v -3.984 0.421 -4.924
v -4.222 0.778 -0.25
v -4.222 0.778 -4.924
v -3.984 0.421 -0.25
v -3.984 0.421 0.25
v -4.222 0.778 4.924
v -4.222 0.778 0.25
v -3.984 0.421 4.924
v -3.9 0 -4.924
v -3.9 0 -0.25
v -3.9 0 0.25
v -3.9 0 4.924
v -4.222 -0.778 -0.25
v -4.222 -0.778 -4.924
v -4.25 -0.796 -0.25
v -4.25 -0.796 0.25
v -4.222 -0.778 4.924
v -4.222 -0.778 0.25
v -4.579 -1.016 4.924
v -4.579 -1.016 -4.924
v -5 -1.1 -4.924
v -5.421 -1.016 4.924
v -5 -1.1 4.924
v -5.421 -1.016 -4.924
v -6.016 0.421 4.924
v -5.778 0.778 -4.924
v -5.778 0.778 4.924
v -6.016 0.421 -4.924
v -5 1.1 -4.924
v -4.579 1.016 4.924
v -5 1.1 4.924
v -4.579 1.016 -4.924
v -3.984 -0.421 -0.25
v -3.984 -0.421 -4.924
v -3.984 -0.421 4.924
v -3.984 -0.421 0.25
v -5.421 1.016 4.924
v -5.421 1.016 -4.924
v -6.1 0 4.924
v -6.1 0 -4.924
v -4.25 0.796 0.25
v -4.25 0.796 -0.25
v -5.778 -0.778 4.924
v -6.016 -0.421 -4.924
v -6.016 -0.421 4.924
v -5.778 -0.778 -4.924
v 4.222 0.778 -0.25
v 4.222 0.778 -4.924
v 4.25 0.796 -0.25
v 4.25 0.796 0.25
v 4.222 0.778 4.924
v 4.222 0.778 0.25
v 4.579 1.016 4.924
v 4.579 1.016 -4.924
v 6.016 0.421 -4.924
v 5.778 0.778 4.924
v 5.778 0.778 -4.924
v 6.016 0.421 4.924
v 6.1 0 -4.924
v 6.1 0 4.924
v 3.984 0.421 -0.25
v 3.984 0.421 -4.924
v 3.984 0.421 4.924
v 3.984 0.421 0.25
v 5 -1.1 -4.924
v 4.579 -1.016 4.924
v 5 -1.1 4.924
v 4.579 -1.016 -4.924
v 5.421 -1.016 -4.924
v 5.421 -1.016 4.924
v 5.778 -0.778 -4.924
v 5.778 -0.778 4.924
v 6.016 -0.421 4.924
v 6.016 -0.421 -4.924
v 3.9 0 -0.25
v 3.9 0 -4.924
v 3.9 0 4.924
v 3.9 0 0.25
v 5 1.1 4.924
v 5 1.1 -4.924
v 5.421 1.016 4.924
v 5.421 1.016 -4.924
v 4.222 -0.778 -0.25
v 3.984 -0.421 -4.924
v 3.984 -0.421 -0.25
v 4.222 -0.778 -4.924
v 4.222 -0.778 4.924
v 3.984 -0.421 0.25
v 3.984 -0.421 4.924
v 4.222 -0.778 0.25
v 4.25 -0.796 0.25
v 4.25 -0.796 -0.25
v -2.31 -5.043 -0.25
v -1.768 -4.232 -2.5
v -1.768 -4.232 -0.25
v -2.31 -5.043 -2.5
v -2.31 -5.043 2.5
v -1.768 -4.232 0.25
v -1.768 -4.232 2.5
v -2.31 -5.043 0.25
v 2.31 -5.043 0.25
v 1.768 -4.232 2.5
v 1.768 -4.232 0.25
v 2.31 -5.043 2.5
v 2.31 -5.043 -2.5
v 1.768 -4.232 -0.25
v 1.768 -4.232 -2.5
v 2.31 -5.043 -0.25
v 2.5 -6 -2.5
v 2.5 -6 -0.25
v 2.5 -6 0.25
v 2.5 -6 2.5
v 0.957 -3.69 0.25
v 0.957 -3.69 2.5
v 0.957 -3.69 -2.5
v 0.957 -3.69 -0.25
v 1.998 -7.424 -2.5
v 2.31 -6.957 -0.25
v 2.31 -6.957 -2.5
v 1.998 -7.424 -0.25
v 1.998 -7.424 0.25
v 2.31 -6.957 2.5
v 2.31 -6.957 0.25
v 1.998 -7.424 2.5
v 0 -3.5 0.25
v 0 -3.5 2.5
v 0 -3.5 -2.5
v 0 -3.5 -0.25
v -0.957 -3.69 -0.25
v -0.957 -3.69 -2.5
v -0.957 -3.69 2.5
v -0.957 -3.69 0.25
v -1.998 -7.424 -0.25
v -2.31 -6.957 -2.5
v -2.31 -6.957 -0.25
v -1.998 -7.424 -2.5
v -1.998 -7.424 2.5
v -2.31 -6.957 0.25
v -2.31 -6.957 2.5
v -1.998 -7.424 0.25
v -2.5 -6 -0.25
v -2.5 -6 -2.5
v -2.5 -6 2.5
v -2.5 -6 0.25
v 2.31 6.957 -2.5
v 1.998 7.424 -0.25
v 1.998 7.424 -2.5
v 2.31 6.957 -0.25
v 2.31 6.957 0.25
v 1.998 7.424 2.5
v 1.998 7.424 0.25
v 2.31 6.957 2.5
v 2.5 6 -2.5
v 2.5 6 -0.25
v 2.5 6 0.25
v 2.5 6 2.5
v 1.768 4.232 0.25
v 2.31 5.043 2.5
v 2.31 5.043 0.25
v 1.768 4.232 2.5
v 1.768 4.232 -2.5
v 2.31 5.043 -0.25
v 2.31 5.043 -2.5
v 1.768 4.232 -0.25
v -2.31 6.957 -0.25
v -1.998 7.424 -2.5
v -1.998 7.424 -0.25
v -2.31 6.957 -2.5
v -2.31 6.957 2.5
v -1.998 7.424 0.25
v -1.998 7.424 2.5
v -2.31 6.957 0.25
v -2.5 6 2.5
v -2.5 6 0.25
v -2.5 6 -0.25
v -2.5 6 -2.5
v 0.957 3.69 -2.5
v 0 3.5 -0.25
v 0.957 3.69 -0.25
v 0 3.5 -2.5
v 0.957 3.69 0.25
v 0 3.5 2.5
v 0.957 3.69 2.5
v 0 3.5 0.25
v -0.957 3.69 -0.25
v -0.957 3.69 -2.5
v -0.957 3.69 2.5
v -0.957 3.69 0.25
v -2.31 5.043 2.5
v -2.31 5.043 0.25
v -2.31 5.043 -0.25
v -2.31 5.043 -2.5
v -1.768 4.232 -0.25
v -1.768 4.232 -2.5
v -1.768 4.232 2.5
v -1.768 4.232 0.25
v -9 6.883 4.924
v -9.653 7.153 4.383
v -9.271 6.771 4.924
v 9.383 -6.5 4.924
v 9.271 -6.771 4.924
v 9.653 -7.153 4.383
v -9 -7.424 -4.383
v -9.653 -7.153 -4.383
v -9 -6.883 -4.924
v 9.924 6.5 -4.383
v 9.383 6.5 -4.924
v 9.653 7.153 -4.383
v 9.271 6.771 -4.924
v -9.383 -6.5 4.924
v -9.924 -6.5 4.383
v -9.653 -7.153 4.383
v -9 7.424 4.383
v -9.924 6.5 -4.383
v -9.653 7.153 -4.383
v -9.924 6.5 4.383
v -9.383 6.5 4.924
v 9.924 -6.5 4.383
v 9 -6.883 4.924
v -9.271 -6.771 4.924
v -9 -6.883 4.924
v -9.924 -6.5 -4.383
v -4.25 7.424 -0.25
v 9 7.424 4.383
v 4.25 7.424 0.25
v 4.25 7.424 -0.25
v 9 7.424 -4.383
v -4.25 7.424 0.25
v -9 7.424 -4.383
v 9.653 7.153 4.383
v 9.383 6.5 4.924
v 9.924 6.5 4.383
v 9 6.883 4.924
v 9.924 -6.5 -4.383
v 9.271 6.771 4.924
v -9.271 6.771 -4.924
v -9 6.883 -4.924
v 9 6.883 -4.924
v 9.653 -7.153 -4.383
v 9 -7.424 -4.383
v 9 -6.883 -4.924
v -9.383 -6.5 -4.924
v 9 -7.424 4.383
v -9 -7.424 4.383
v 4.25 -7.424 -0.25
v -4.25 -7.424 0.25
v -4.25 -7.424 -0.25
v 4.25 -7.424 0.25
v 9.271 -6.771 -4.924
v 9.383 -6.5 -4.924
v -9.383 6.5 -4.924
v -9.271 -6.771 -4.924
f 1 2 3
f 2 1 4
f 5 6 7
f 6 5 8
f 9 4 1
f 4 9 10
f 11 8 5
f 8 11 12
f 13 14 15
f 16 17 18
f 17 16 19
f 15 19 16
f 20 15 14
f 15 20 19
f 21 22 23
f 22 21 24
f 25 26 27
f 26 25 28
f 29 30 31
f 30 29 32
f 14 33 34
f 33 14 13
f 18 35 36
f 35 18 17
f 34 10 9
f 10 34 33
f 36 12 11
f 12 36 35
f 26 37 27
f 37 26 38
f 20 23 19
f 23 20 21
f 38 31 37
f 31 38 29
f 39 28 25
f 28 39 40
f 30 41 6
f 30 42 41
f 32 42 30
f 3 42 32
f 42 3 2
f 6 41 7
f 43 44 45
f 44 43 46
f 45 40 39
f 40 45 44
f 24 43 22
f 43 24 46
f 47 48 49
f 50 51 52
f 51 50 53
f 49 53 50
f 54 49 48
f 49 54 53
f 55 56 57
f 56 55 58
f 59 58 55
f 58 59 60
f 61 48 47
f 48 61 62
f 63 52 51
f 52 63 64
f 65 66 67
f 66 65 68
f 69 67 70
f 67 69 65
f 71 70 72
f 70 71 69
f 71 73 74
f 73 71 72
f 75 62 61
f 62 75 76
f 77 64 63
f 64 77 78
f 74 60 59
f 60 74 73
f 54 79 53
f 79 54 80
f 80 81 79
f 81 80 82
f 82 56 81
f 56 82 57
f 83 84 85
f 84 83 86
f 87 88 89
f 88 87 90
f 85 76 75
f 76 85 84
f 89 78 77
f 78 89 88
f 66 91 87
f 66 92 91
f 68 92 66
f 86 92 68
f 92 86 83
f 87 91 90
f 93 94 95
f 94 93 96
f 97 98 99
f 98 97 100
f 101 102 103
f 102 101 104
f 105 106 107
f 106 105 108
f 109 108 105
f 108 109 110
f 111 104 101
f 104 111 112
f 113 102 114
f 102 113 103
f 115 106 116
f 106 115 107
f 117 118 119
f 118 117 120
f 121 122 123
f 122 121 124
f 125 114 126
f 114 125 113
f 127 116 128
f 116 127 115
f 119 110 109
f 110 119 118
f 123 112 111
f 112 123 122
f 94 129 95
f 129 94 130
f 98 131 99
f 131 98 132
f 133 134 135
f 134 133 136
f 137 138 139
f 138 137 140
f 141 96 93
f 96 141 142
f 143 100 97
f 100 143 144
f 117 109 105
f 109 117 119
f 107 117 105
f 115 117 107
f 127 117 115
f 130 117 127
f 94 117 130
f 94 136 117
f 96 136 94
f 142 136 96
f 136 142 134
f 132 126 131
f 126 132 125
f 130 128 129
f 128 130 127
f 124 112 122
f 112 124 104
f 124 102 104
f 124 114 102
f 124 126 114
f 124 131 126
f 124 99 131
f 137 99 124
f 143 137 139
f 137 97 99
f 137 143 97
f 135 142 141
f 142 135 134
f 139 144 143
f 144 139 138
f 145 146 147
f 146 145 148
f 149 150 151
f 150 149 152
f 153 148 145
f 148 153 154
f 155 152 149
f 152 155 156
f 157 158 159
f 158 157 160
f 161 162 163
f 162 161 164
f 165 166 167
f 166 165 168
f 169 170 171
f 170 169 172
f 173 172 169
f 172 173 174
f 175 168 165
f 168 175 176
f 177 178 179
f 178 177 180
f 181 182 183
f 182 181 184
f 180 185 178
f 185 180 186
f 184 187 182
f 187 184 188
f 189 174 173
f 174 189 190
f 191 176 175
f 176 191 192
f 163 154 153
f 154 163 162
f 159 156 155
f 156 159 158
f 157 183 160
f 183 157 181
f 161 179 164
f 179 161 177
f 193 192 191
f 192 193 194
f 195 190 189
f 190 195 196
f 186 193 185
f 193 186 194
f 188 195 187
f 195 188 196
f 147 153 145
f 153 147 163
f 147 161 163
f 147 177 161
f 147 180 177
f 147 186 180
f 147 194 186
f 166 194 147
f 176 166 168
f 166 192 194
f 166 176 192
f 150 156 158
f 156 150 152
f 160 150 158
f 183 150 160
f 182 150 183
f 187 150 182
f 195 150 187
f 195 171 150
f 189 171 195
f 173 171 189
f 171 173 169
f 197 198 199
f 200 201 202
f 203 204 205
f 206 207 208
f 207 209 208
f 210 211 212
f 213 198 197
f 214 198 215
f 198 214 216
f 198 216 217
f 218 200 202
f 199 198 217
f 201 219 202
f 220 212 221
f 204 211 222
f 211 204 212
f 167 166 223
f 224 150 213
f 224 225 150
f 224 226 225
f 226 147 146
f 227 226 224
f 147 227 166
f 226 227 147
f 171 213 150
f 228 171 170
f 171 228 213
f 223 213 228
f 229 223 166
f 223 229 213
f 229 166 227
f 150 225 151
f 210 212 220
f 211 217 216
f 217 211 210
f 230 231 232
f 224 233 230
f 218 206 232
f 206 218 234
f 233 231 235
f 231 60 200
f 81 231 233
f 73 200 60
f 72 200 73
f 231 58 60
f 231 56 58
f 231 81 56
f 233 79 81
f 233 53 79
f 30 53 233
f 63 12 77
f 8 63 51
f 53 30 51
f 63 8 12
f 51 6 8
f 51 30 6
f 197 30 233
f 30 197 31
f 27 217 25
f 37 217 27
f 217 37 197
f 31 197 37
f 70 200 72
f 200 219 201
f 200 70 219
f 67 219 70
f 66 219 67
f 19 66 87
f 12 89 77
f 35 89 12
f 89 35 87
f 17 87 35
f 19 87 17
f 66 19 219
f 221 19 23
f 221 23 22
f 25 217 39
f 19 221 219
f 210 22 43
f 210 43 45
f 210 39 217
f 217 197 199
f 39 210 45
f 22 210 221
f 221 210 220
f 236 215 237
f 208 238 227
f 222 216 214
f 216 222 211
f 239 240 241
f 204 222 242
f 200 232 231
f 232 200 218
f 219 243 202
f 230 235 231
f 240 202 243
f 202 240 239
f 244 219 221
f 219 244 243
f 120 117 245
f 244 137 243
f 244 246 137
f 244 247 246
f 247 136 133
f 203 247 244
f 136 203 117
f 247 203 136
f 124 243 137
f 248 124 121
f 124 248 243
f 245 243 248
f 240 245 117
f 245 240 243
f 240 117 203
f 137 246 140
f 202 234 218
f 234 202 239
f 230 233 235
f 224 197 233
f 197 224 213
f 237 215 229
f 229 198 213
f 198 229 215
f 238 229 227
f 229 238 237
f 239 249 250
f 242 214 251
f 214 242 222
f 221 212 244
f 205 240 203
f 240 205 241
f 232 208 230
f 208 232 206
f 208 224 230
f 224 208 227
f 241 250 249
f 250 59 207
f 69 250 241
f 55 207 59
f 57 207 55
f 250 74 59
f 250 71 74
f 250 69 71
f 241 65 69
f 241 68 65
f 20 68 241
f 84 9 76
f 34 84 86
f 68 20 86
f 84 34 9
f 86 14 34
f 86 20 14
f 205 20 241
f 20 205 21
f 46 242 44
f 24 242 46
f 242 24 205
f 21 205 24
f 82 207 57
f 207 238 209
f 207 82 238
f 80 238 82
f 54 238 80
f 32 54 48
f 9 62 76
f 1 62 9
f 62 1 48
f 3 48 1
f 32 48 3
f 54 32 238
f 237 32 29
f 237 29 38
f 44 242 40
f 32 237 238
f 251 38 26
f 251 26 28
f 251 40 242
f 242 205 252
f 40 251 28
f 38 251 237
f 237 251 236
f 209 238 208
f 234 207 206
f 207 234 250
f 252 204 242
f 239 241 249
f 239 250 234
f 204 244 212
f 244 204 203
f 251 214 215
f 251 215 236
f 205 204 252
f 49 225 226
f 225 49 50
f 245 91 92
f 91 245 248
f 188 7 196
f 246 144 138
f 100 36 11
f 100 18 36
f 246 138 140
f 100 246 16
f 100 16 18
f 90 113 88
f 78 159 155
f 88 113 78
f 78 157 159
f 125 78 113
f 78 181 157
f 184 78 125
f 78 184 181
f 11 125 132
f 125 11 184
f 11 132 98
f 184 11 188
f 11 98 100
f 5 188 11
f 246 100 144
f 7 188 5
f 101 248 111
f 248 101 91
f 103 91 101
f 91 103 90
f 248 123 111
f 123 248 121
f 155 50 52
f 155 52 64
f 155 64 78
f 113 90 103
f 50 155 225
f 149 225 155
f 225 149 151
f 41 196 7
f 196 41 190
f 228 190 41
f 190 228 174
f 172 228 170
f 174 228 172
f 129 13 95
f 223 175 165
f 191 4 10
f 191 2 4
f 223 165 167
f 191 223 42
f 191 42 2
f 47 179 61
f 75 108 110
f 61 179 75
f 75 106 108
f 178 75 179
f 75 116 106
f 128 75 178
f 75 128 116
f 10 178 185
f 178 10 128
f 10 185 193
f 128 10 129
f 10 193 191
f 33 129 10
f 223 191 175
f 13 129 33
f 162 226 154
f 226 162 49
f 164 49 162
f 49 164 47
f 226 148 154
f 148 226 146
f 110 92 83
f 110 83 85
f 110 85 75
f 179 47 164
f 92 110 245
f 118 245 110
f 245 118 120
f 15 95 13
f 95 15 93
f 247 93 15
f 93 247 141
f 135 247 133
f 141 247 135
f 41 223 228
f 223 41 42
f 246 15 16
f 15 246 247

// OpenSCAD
// ============================================================
//  tpu_joint_j3.scad — Passiver TPU-Federblock J3
//  Material: TPU 95A, 25% Gyroid Infill
//  Funktion: Elastische Verbindung Segment 2 → Segment 3
//  Resonanz: f_res ≈ 1.0 Hz
// ============================================================

// Parameter
breite     = 20;   // mm (X)
tiefe      = 15;   // mm (Y)
hoehe      = 10;   // mm (Z)
wand       = 1.2;  // mm Wandstärke (3 Perimeter à 0.4mm)
bolzen_r   = 1.1;  // mm Radius M2-Bohrung
stahl_h    = 0.5;  // mm Federstahl-Kanal Höhe
stahl_b    = 8.5;  // mm Federstahl-Kanal Breite
fase       = 1.0;  // mm Fase an Kanten (Druckbarkeit)

module tpu_federblock(b, t, h, wand, bolzen_r, stahl_h, stahl_b, fase) {
    difference() {
        // Grundkörper mit Fasen
        hull() {
            for (x = [-b/2+fase, b/2-fase])
            for (y = [-t/2+fase, t/2-fase])
            for (z = [-h/2+fase, h/2-fase])
                translate([x, y, z]) sphere(r=fase, $fn=8);
        }

        // Federstahl-Kanal (horizontal, bei Z=0)
        translate([0, 0, 0])
            cube([stahl_b, t+1, stahl_h], center=true);

        // M2-Montage-Bohrungen (2× längs, für Segmentbefestigung)
        for (x = [-b/4, b/4])
            translate([x, 0, 0])
                cylinder(h=h+1, r=bolzen_r, $fn=16, center=true);

        // Segmentverbindungs-Zapfen-Aufnahmen (vorne + hinten, Ø5mm × 3mm tief)
        for (y = [-t/2+1.5, t/2-1.5])
            translate([0, y, 0])
                cylinder(h=5, r=2.5, $fn=16, center=true);
    }
}

tpu_federblock(breite, tiefe, hoehe, wand, bolzen_r, stahl_h, stahl_b, fase);

// Info
echo(str("J3 TPU-Federblock: ", breite, "×", tiefe, "×", hoehe, "mm"));
echo(str("Material: TPU 95A | Infill: 25% Gyroid"));
echo(str("Federstahl-Kanal: ", stahl_b, "mm × ", stahl_h, "mm bei Z=0"));
echo(str("Resonanz: ~1.0 Hz | Erwartete Amplitude: ±8-10°"));
